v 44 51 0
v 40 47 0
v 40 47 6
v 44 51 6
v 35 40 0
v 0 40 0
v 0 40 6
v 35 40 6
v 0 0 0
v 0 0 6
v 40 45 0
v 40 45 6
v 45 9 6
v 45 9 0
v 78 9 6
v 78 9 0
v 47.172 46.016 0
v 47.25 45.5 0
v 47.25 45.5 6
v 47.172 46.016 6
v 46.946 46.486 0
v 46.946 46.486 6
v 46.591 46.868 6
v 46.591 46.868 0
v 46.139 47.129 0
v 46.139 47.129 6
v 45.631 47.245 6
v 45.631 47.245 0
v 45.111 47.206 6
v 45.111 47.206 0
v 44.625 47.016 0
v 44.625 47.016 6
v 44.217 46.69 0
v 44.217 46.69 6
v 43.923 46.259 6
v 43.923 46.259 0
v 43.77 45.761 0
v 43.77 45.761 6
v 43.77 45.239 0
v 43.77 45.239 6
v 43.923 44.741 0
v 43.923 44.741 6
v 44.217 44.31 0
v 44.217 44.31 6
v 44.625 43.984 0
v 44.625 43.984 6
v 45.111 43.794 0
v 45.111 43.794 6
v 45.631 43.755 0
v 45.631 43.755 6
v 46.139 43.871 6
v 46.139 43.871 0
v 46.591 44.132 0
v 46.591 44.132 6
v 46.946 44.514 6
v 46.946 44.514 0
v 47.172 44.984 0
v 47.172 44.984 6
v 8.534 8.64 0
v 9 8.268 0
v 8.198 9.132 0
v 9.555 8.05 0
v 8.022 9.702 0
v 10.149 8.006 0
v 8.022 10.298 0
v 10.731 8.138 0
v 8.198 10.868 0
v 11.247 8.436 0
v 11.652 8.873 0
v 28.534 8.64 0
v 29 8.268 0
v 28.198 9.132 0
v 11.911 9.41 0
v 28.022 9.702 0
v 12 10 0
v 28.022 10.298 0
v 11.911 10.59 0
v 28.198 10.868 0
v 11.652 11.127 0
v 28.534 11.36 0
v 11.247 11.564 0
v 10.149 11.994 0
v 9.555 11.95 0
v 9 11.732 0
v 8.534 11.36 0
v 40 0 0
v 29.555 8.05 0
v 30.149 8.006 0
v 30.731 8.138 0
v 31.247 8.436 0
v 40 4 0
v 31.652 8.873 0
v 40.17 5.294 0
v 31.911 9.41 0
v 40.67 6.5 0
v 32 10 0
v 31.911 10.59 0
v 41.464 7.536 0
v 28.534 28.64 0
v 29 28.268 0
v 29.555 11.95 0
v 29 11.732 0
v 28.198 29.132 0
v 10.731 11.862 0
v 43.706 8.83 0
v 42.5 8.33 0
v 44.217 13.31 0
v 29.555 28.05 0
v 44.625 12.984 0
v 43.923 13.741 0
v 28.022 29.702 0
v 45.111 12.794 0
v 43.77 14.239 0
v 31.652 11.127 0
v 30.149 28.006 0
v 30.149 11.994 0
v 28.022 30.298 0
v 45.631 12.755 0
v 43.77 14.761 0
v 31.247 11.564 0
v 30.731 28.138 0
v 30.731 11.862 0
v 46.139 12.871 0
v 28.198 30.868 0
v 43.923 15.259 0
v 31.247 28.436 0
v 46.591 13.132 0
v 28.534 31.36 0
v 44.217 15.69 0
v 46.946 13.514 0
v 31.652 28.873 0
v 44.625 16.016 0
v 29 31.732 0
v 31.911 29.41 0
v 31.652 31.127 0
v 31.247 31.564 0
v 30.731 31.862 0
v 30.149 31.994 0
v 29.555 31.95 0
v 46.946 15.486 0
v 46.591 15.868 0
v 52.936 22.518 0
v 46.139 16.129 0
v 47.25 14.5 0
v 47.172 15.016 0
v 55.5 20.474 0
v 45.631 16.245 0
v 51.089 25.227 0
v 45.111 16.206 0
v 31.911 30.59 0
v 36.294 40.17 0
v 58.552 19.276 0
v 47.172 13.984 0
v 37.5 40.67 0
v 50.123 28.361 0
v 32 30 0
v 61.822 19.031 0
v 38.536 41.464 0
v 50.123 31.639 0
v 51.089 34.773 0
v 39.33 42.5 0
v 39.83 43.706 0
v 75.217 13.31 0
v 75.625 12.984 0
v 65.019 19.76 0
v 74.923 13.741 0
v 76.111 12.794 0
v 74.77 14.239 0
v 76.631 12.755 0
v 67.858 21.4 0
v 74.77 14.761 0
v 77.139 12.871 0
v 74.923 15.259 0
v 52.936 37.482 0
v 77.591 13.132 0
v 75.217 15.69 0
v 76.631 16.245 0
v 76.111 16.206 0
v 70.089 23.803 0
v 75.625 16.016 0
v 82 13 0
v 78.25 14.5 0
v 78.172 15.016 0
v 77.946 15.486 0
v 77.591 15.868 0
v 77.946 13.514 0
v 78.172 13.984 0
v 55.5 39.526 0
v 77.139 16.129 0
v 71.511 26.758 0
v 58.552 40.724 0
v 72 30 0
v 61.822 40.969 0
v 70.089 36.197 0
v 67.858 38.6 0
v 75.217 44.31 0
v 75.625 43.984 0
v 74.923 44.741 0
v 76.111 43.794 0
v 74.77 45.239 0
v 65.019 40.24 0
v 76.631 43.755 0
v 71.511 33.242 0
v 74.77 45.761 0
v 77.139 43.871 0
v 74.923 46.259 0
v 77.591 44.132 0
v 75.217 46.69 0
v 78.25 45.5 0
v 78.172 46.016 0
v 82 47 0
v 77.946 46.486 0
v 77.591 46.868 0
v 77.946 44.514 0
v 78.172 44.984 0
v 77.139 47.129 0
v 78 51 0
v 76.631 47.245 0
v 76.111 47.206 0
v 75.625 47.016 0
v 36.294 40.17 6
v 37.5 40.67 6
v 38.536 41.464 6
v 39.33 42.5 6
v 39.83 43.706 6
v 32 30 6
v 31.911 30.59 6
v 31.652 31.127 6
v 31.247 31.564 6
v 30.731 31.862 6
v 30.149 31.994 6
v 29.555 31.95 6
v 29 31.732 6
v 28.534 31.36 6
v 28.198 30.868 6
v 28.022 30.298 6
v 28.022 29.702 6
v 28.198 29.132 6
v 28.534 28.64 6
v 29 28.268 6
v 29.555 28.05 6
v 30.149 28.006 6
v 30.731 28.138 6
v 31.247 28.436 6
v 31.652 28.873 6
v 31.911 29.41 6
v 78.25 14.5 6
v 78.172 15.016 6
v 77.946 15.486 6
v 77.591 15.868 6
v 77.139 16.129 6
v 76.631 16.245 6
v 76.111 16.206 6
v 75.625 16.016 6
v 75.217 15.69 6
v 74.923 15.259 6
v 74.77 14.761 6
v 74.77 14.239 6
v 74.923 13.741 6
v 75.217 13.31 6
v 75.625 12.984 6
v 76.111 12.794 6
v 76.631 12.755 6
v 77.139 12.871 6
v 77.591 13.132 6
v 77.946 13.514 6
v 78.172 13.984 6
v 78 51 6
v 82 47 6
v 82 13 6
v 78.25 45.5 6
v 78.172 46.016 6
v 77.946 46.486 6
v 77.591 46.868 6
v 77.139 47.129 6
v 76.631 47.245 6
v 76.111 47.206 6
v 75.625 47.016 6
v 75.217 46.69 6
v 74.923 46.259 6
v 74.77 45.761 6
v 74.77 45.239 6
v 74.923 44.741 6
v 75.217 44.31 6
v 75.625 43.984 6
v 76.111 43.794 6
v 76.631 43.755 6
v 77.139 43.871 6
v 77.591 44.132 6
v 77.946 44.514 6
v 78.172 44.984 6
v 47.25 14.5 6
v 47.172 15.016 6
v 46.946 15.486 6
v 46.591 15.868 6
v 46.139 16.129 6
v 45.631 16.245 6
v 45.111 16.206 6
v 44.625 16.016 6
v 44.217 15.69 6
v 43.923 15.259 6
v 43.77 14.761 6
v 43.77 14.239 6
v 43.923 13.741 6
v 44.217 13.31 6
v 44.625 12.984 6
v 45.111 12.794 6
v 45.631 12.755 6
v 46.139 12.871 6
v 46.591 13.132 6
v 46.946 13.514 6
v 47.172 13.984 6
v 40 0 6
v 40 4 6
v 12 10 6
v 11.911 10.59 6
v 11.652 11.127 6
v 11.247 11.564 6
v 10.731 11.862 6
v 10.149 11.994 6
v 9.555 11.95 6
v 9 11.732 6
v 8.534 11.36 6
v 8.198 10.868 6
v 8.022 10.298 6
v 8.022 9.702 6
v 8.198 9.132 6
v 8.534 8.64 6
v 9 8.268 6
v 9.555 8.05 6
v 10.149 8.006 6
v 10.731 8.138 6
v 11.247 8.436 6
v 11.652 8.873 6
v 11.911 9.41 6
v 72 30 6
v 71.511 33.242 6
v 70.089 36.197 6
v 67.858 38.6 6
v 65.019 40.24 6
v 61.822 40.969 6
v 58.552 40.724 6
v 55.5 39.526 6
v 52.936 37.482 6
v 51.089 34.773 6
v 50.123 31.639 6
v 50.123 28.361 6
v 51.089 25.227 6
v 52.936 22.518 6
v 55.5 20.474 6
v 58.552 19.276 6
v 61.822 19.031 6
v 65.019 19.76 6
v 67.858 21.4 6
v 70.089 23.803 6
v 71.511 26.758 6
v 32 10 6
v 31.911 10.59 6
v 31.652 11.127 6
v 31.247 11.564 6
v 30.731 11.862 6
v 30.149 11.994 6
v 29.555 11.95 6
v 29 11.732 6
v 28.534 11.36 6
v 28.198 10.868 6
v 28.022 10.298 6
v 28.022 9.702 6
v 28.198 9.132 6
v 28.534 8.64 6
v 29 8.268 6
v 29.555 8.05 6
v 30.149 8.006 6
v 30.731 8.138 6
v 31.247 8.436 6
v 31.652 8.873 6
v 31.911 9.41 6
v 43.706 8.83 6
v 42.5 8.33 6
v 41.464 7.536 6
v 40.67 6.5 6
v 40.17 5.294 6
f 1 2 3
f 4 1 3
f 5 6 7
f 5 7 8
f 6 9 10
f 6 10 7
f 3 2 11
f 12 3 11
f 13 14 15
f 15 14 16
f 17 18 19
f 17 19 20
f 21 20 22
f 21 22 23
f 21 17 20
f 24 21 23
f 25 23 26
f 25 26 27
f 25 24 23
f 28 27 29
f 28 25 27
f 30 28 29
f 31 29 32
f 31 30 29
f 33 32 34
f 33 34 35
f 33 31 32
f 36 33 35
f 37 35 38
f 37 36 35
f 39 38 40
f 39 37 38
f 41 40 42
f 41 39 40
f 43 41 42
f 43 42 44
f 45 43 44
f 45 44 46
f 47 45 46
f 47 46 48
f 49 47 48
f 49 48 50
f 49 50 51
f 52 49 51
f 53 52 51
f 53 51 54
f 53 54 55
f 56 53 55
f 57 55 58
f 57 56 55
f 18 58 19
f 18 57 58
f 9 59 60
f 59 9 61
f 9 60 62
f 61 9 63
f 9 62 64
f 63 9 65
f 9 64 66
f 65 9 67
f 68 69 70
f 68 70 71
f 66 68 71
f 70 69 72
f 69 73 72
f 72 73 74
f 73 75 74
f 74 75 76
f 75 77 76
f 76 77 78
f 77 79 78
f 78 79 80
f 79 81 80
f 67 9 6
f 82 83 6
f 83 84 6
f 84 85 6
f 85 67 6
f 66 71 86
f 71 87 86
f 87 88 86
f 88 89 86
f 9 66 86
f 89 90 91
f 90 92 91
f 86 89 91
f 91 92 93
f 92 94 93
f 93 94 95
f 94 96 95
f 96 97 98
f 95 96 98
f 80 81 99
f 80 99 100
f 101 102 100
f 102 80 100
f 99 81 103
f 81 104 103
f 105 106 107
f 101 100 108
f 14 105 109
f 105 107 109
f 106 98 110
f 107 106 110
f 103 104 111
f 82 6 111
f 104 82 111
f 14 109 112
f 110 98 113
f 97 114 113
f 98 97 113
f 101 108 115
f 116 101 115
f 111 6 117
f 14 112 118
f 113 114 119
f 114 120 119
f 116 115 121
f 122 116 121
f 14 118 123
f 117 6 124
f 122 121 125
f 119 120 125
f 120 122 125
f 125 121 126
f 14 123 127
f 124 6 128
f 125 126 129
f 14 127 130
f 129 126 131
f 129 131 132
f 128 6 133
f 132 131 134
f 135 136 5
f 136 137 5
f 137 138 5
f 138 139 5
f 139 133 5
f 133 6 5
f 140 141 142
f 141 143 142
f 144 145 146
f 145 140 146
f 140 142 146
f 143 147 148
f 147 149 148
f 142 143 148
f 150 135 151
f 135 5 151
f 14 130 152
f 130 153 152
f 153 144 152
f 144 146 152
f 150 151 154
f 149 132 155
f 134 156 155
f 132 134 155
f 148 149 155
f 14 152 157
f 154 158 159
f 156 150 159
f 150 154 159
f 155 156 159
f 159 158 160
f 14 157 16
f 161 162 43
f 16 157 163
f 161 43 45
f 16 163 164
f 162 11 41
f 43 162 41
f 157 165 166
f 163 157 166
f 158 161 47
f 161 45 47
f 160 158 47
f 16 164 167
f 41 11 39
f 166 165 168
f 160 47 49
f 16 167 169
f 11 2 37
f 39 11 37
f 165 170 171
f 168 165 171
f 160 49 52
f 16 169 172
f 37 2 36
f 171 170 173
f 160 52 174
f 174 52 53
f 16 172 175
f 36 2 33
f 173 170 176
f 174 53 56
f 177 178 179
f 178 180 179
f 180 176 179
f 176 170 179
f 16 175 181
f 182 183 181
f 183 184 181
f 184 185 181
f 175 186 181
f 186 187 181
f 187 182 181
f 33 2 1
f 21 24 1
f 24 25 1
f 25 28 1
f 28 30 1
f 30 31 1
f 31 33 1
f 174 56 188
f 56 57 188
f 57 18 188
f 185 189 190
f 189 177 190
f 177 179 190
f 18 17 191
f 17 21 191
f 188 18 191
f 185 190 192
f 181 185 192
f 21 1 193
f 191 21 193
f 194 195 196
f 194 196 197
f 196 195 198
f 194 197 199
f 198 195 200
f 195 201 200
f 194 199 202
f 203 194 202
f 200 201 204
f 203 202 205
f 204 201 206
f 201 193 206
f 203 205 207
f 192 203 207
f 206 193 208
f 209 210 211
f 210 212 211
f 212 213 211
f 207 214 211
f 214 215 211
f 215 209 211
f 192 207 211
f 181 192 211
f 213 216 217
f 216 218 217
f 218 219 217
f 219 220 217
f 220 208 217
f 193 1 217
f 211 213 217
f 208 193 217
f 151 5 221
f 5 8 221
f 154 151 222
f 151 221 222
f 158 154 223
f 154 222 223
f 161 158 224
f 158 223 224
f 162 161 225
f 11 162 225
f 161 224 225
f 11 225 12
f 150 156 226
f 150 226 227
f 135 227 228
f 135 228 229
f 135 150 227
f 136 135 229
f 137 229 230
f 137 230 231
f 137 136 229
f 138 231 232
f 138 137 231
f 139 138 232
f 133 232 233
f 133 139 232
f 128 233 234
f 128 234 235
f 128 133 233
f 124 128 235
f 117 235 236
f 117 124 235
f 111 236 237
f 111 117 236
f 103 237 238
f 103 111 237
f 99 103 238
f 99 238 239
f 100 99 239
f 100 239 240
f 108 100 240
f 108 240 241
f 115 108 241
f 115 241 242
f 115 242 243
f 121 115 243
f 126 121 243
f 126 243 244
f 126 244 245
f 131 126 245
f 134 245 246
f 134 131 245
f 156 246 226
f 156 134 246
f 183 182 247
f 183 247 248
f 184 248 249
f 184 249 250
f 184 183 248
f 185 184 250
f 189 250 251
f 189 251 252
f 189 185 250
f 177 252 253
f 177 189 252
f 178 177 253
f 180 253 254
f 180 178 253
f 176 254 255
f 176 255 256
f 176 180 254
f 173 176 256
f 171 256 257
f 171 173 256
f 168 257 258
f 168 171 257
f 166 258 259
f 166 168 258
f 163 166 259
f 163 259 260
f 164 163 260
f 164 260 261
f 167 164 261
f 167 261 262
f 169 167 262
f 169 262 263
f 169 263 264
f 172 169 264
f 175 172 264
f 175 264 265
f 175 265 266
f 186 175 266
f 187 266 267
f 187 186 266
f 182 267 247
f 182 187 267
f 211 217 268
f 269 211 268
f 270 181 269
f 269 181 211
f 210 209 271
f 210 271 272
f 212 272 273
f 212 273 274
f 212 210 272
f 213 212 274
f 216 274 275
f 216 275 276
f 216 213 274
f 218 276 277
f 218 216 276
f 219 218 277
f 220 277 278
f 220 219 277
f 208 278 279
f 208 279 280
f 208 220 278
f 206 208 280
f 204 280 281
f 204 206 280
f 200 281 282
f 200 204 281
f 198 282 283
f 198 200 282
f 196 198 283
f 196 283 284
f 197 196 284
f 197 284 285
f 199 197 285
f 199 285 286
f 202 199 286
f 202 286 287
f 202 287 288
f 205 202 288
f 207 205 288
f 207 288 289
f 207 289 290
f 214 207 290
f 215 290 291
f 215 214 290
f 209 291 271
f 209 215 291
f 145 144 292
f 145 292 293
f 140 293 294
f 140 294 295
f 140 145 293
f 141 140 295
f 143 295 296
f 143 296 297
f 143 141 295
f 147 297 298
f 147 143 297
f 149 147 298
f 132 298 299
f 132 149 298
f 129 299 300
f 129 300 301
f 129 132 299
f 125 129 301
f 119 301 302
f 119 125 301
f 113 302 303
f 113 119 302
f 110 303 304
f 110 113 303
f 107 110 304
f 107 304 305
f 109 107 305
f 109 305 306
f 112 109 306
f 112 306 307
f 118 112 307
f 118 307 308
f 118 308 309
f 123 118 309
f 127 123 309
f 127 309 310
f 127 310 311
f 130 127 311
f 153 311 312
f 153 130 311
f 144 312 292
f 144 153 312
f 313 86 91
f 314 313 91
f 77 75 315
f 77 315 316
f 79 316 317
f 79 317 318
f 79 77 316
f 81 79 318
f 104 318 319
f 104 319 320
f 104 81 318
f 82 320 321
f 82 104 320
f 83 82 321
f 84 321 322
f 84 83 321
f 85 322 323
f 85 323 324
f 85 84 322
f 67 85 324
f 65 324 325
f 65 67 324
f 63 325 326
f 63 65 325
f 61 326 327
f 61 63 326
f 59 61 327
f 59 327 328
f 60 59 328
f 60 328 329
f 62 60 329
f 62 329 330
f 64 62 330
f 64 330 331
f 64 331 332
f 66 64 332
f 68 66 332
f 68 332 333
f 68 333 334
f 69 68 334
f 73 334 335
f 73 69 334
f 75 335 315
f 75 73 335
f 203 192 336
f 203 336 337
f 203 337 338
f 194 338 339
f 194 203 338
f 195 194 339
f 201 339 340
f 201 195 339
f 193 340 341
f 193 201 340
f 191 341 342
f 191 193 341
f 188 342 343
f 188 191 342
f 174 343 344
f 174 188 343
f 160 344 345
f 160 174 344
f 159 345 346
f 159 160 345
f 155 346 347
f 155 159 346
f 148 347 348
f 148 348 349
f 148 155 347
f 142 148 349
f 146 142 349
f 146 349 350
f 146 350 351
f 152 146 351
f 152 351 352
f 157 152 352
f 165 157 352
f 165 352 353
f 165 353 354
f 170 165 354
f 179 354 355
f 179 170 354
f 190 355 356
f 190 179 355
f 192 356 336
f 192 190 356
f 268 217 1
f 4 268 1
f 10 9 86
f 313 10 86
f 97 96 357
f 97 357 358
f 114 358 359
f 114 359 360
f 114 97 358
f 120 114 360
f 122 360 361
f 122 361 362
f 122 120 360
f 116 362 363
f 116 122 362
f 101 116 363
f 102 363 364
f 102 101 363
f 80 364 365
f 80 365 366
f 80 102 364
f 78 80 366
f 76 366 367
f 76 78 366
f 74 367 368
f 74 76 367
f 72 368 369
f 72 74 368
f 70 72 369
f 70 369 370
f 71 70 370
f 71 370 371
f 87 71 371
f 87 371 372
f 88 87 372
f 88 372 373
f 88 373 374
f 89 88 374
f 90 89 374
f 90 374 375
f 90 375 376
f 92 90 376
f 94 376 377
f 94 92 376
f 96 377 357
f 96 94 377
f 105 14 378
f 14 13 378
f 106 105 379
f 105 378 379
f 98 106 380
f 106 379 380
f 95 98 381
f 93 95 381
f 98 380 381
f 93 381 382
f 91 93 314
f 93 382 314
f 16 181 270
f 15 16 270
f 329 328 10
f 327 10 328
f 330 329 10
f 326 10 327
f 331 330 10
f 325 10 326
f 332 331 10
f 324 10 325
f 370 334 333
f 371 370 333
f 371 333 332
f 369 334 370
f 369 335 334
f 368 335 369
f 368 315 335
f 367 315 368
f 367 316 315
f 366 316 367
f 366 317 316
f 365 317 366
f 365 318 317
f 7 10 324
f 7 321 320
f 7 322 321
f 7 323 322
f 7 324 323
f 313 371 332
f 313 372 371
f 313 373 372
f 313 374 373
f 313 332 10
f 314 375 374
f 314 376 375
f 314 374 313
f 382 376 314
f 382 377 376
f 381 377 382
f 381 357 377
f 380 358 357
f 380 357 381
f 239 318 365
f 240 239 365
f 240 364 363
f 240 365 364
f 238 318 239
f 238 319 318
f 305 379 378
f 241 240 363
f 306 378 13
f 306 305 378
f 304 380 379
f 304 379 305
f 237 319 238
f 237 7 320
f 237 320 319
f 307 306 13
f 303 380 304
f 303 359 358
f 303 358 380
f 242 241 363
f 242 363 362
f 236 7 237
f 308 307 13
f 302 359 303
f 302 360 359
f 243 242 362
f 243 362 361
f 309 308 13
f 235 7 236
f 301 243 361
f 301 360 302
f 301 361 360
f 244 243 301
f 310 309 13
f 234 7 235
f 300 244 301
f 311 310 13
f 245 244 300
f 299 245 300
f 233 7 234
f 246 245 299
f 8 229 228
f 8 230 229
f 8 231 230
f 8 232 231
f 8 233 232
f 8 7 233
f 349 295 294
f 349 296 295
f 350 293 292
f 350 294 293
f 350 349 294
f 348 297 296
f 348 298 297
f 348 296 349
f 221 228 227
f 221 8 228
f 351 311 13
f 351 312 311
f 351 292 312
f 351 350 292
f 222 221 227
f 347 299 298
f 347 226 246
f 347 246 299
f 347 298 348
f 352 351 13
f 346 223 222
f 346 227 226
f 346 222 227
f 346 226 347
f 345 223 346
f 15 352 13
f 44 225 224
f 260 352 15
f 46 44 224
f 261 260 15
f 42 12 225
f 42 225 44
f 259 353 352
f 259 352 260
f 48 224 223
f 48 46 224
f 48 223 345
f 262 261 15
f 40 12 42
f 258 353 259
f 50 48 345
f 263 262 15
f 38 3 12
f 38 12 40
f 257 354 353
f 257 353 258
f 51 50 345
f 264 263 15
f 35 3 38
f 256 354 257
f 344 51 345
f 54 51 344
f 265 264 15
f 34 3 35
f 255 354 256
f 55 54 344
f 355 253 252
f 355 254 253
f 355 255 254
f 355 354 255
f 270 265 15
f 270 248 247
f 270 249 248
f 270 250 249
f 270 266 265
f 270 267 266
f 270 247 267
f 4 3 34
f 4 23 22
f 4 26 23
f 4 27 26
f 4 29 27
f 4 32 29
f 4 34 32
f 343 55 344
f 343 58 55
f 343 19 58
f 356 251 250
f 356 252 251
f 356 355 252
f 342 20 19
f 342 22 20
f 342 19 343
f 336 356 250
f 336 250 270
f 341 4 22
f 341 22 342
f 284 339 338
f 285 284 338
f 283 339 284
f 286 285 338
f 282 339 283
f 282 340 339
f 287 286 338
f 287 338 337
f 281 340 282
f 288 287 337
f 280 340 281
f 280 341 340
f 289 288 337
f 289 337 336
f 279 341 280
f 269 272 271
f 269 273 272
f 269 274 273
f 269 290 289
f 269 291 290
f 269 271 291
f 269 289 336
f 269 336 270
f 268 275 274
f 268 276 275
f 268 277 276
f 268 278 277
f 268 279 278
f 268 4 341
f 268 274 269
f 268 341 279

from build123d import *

# Parameters (mm, degrees)
ESBO_O1_W                = 40
ESBO_O1_H                = 40
ESBO_O1_R                = 2
ESBO_O1_R_2              = 1.75
ESBO_O1_R_3              = 11
RESSALTO_EXTRUS_O1_DEPTH = 6
CHANFRO1_SIZE            = 4
FILETE1_R                = 5


with BuildPart() as part:
    # Esboço1 → Ressalto-extrusão1 (new body)
    # profile 1 of 2: a face of its own
    with BuildSketch(Plane.XY):
        with Locations((20, 20)):
            Rectangle(ESBO_O1_W, ESBO_O1_H)
        with Locations((30, 30)):
            Circle(ESBO_O1_R, mode=Mode.SUBTRACT)
        with Locations((10, 10)):
            Circle(ESBO_O1_R, mode=Mode.SUBTRACT)
        with Locations((30, 10)):
            Circle(ESBO_O1_R, mode=Mode.SUBTRACT)
    # profile 2 of 2: a face of its own
    with BuildSketch(Plane.XY):
        Polygon((40, 40), (40, 9), (82, 9), (82, 51), (40, 51), align=None)
        with Locations((45.5, 14.5)):
            Circle(ESBO_O1_R_2, mode=Mode.SUBTRACT)
        with Locations((76.5, 14.5)):
            Circle(ESBO_O1_R_2, mode=Mode.SUBTRACT)
        with Locations((61, 30)):
            Circle(ESBO_O1_R_3, mode=Mode.SUBTRACT)
        with Locations((45.5, 45.5)):
            Circle(ESBO_O1_R_2, mode=Mode.SUBTRACT)
        with Locations((76.5, 45.5)):
            Circle(ESBO_O1_R_2, mode=Mode.SUBTRACT)
    extrude(amount=RESSALTO_EXTRUS_O1_DEPTH)

    # Chanfro1
    chanfro1_edges = [part.edges().sort_by_distance(p)[0] for p in [
        (40, 51, 3),
        (82, 51, 3),
        (82, 9, 3),
    ]]
    chamfer(chanfro1_edges, length=CHANFRO1_SIZE)

    # Filete1
    filete1_edges = [part.edges().sort_by_distance(p)[0] for p in [
        (40, 40, 3),
        (40, 9, 3),
    ]]
    fillet(filete1_edges, radius=FILETE1_R)


solid = part.part
